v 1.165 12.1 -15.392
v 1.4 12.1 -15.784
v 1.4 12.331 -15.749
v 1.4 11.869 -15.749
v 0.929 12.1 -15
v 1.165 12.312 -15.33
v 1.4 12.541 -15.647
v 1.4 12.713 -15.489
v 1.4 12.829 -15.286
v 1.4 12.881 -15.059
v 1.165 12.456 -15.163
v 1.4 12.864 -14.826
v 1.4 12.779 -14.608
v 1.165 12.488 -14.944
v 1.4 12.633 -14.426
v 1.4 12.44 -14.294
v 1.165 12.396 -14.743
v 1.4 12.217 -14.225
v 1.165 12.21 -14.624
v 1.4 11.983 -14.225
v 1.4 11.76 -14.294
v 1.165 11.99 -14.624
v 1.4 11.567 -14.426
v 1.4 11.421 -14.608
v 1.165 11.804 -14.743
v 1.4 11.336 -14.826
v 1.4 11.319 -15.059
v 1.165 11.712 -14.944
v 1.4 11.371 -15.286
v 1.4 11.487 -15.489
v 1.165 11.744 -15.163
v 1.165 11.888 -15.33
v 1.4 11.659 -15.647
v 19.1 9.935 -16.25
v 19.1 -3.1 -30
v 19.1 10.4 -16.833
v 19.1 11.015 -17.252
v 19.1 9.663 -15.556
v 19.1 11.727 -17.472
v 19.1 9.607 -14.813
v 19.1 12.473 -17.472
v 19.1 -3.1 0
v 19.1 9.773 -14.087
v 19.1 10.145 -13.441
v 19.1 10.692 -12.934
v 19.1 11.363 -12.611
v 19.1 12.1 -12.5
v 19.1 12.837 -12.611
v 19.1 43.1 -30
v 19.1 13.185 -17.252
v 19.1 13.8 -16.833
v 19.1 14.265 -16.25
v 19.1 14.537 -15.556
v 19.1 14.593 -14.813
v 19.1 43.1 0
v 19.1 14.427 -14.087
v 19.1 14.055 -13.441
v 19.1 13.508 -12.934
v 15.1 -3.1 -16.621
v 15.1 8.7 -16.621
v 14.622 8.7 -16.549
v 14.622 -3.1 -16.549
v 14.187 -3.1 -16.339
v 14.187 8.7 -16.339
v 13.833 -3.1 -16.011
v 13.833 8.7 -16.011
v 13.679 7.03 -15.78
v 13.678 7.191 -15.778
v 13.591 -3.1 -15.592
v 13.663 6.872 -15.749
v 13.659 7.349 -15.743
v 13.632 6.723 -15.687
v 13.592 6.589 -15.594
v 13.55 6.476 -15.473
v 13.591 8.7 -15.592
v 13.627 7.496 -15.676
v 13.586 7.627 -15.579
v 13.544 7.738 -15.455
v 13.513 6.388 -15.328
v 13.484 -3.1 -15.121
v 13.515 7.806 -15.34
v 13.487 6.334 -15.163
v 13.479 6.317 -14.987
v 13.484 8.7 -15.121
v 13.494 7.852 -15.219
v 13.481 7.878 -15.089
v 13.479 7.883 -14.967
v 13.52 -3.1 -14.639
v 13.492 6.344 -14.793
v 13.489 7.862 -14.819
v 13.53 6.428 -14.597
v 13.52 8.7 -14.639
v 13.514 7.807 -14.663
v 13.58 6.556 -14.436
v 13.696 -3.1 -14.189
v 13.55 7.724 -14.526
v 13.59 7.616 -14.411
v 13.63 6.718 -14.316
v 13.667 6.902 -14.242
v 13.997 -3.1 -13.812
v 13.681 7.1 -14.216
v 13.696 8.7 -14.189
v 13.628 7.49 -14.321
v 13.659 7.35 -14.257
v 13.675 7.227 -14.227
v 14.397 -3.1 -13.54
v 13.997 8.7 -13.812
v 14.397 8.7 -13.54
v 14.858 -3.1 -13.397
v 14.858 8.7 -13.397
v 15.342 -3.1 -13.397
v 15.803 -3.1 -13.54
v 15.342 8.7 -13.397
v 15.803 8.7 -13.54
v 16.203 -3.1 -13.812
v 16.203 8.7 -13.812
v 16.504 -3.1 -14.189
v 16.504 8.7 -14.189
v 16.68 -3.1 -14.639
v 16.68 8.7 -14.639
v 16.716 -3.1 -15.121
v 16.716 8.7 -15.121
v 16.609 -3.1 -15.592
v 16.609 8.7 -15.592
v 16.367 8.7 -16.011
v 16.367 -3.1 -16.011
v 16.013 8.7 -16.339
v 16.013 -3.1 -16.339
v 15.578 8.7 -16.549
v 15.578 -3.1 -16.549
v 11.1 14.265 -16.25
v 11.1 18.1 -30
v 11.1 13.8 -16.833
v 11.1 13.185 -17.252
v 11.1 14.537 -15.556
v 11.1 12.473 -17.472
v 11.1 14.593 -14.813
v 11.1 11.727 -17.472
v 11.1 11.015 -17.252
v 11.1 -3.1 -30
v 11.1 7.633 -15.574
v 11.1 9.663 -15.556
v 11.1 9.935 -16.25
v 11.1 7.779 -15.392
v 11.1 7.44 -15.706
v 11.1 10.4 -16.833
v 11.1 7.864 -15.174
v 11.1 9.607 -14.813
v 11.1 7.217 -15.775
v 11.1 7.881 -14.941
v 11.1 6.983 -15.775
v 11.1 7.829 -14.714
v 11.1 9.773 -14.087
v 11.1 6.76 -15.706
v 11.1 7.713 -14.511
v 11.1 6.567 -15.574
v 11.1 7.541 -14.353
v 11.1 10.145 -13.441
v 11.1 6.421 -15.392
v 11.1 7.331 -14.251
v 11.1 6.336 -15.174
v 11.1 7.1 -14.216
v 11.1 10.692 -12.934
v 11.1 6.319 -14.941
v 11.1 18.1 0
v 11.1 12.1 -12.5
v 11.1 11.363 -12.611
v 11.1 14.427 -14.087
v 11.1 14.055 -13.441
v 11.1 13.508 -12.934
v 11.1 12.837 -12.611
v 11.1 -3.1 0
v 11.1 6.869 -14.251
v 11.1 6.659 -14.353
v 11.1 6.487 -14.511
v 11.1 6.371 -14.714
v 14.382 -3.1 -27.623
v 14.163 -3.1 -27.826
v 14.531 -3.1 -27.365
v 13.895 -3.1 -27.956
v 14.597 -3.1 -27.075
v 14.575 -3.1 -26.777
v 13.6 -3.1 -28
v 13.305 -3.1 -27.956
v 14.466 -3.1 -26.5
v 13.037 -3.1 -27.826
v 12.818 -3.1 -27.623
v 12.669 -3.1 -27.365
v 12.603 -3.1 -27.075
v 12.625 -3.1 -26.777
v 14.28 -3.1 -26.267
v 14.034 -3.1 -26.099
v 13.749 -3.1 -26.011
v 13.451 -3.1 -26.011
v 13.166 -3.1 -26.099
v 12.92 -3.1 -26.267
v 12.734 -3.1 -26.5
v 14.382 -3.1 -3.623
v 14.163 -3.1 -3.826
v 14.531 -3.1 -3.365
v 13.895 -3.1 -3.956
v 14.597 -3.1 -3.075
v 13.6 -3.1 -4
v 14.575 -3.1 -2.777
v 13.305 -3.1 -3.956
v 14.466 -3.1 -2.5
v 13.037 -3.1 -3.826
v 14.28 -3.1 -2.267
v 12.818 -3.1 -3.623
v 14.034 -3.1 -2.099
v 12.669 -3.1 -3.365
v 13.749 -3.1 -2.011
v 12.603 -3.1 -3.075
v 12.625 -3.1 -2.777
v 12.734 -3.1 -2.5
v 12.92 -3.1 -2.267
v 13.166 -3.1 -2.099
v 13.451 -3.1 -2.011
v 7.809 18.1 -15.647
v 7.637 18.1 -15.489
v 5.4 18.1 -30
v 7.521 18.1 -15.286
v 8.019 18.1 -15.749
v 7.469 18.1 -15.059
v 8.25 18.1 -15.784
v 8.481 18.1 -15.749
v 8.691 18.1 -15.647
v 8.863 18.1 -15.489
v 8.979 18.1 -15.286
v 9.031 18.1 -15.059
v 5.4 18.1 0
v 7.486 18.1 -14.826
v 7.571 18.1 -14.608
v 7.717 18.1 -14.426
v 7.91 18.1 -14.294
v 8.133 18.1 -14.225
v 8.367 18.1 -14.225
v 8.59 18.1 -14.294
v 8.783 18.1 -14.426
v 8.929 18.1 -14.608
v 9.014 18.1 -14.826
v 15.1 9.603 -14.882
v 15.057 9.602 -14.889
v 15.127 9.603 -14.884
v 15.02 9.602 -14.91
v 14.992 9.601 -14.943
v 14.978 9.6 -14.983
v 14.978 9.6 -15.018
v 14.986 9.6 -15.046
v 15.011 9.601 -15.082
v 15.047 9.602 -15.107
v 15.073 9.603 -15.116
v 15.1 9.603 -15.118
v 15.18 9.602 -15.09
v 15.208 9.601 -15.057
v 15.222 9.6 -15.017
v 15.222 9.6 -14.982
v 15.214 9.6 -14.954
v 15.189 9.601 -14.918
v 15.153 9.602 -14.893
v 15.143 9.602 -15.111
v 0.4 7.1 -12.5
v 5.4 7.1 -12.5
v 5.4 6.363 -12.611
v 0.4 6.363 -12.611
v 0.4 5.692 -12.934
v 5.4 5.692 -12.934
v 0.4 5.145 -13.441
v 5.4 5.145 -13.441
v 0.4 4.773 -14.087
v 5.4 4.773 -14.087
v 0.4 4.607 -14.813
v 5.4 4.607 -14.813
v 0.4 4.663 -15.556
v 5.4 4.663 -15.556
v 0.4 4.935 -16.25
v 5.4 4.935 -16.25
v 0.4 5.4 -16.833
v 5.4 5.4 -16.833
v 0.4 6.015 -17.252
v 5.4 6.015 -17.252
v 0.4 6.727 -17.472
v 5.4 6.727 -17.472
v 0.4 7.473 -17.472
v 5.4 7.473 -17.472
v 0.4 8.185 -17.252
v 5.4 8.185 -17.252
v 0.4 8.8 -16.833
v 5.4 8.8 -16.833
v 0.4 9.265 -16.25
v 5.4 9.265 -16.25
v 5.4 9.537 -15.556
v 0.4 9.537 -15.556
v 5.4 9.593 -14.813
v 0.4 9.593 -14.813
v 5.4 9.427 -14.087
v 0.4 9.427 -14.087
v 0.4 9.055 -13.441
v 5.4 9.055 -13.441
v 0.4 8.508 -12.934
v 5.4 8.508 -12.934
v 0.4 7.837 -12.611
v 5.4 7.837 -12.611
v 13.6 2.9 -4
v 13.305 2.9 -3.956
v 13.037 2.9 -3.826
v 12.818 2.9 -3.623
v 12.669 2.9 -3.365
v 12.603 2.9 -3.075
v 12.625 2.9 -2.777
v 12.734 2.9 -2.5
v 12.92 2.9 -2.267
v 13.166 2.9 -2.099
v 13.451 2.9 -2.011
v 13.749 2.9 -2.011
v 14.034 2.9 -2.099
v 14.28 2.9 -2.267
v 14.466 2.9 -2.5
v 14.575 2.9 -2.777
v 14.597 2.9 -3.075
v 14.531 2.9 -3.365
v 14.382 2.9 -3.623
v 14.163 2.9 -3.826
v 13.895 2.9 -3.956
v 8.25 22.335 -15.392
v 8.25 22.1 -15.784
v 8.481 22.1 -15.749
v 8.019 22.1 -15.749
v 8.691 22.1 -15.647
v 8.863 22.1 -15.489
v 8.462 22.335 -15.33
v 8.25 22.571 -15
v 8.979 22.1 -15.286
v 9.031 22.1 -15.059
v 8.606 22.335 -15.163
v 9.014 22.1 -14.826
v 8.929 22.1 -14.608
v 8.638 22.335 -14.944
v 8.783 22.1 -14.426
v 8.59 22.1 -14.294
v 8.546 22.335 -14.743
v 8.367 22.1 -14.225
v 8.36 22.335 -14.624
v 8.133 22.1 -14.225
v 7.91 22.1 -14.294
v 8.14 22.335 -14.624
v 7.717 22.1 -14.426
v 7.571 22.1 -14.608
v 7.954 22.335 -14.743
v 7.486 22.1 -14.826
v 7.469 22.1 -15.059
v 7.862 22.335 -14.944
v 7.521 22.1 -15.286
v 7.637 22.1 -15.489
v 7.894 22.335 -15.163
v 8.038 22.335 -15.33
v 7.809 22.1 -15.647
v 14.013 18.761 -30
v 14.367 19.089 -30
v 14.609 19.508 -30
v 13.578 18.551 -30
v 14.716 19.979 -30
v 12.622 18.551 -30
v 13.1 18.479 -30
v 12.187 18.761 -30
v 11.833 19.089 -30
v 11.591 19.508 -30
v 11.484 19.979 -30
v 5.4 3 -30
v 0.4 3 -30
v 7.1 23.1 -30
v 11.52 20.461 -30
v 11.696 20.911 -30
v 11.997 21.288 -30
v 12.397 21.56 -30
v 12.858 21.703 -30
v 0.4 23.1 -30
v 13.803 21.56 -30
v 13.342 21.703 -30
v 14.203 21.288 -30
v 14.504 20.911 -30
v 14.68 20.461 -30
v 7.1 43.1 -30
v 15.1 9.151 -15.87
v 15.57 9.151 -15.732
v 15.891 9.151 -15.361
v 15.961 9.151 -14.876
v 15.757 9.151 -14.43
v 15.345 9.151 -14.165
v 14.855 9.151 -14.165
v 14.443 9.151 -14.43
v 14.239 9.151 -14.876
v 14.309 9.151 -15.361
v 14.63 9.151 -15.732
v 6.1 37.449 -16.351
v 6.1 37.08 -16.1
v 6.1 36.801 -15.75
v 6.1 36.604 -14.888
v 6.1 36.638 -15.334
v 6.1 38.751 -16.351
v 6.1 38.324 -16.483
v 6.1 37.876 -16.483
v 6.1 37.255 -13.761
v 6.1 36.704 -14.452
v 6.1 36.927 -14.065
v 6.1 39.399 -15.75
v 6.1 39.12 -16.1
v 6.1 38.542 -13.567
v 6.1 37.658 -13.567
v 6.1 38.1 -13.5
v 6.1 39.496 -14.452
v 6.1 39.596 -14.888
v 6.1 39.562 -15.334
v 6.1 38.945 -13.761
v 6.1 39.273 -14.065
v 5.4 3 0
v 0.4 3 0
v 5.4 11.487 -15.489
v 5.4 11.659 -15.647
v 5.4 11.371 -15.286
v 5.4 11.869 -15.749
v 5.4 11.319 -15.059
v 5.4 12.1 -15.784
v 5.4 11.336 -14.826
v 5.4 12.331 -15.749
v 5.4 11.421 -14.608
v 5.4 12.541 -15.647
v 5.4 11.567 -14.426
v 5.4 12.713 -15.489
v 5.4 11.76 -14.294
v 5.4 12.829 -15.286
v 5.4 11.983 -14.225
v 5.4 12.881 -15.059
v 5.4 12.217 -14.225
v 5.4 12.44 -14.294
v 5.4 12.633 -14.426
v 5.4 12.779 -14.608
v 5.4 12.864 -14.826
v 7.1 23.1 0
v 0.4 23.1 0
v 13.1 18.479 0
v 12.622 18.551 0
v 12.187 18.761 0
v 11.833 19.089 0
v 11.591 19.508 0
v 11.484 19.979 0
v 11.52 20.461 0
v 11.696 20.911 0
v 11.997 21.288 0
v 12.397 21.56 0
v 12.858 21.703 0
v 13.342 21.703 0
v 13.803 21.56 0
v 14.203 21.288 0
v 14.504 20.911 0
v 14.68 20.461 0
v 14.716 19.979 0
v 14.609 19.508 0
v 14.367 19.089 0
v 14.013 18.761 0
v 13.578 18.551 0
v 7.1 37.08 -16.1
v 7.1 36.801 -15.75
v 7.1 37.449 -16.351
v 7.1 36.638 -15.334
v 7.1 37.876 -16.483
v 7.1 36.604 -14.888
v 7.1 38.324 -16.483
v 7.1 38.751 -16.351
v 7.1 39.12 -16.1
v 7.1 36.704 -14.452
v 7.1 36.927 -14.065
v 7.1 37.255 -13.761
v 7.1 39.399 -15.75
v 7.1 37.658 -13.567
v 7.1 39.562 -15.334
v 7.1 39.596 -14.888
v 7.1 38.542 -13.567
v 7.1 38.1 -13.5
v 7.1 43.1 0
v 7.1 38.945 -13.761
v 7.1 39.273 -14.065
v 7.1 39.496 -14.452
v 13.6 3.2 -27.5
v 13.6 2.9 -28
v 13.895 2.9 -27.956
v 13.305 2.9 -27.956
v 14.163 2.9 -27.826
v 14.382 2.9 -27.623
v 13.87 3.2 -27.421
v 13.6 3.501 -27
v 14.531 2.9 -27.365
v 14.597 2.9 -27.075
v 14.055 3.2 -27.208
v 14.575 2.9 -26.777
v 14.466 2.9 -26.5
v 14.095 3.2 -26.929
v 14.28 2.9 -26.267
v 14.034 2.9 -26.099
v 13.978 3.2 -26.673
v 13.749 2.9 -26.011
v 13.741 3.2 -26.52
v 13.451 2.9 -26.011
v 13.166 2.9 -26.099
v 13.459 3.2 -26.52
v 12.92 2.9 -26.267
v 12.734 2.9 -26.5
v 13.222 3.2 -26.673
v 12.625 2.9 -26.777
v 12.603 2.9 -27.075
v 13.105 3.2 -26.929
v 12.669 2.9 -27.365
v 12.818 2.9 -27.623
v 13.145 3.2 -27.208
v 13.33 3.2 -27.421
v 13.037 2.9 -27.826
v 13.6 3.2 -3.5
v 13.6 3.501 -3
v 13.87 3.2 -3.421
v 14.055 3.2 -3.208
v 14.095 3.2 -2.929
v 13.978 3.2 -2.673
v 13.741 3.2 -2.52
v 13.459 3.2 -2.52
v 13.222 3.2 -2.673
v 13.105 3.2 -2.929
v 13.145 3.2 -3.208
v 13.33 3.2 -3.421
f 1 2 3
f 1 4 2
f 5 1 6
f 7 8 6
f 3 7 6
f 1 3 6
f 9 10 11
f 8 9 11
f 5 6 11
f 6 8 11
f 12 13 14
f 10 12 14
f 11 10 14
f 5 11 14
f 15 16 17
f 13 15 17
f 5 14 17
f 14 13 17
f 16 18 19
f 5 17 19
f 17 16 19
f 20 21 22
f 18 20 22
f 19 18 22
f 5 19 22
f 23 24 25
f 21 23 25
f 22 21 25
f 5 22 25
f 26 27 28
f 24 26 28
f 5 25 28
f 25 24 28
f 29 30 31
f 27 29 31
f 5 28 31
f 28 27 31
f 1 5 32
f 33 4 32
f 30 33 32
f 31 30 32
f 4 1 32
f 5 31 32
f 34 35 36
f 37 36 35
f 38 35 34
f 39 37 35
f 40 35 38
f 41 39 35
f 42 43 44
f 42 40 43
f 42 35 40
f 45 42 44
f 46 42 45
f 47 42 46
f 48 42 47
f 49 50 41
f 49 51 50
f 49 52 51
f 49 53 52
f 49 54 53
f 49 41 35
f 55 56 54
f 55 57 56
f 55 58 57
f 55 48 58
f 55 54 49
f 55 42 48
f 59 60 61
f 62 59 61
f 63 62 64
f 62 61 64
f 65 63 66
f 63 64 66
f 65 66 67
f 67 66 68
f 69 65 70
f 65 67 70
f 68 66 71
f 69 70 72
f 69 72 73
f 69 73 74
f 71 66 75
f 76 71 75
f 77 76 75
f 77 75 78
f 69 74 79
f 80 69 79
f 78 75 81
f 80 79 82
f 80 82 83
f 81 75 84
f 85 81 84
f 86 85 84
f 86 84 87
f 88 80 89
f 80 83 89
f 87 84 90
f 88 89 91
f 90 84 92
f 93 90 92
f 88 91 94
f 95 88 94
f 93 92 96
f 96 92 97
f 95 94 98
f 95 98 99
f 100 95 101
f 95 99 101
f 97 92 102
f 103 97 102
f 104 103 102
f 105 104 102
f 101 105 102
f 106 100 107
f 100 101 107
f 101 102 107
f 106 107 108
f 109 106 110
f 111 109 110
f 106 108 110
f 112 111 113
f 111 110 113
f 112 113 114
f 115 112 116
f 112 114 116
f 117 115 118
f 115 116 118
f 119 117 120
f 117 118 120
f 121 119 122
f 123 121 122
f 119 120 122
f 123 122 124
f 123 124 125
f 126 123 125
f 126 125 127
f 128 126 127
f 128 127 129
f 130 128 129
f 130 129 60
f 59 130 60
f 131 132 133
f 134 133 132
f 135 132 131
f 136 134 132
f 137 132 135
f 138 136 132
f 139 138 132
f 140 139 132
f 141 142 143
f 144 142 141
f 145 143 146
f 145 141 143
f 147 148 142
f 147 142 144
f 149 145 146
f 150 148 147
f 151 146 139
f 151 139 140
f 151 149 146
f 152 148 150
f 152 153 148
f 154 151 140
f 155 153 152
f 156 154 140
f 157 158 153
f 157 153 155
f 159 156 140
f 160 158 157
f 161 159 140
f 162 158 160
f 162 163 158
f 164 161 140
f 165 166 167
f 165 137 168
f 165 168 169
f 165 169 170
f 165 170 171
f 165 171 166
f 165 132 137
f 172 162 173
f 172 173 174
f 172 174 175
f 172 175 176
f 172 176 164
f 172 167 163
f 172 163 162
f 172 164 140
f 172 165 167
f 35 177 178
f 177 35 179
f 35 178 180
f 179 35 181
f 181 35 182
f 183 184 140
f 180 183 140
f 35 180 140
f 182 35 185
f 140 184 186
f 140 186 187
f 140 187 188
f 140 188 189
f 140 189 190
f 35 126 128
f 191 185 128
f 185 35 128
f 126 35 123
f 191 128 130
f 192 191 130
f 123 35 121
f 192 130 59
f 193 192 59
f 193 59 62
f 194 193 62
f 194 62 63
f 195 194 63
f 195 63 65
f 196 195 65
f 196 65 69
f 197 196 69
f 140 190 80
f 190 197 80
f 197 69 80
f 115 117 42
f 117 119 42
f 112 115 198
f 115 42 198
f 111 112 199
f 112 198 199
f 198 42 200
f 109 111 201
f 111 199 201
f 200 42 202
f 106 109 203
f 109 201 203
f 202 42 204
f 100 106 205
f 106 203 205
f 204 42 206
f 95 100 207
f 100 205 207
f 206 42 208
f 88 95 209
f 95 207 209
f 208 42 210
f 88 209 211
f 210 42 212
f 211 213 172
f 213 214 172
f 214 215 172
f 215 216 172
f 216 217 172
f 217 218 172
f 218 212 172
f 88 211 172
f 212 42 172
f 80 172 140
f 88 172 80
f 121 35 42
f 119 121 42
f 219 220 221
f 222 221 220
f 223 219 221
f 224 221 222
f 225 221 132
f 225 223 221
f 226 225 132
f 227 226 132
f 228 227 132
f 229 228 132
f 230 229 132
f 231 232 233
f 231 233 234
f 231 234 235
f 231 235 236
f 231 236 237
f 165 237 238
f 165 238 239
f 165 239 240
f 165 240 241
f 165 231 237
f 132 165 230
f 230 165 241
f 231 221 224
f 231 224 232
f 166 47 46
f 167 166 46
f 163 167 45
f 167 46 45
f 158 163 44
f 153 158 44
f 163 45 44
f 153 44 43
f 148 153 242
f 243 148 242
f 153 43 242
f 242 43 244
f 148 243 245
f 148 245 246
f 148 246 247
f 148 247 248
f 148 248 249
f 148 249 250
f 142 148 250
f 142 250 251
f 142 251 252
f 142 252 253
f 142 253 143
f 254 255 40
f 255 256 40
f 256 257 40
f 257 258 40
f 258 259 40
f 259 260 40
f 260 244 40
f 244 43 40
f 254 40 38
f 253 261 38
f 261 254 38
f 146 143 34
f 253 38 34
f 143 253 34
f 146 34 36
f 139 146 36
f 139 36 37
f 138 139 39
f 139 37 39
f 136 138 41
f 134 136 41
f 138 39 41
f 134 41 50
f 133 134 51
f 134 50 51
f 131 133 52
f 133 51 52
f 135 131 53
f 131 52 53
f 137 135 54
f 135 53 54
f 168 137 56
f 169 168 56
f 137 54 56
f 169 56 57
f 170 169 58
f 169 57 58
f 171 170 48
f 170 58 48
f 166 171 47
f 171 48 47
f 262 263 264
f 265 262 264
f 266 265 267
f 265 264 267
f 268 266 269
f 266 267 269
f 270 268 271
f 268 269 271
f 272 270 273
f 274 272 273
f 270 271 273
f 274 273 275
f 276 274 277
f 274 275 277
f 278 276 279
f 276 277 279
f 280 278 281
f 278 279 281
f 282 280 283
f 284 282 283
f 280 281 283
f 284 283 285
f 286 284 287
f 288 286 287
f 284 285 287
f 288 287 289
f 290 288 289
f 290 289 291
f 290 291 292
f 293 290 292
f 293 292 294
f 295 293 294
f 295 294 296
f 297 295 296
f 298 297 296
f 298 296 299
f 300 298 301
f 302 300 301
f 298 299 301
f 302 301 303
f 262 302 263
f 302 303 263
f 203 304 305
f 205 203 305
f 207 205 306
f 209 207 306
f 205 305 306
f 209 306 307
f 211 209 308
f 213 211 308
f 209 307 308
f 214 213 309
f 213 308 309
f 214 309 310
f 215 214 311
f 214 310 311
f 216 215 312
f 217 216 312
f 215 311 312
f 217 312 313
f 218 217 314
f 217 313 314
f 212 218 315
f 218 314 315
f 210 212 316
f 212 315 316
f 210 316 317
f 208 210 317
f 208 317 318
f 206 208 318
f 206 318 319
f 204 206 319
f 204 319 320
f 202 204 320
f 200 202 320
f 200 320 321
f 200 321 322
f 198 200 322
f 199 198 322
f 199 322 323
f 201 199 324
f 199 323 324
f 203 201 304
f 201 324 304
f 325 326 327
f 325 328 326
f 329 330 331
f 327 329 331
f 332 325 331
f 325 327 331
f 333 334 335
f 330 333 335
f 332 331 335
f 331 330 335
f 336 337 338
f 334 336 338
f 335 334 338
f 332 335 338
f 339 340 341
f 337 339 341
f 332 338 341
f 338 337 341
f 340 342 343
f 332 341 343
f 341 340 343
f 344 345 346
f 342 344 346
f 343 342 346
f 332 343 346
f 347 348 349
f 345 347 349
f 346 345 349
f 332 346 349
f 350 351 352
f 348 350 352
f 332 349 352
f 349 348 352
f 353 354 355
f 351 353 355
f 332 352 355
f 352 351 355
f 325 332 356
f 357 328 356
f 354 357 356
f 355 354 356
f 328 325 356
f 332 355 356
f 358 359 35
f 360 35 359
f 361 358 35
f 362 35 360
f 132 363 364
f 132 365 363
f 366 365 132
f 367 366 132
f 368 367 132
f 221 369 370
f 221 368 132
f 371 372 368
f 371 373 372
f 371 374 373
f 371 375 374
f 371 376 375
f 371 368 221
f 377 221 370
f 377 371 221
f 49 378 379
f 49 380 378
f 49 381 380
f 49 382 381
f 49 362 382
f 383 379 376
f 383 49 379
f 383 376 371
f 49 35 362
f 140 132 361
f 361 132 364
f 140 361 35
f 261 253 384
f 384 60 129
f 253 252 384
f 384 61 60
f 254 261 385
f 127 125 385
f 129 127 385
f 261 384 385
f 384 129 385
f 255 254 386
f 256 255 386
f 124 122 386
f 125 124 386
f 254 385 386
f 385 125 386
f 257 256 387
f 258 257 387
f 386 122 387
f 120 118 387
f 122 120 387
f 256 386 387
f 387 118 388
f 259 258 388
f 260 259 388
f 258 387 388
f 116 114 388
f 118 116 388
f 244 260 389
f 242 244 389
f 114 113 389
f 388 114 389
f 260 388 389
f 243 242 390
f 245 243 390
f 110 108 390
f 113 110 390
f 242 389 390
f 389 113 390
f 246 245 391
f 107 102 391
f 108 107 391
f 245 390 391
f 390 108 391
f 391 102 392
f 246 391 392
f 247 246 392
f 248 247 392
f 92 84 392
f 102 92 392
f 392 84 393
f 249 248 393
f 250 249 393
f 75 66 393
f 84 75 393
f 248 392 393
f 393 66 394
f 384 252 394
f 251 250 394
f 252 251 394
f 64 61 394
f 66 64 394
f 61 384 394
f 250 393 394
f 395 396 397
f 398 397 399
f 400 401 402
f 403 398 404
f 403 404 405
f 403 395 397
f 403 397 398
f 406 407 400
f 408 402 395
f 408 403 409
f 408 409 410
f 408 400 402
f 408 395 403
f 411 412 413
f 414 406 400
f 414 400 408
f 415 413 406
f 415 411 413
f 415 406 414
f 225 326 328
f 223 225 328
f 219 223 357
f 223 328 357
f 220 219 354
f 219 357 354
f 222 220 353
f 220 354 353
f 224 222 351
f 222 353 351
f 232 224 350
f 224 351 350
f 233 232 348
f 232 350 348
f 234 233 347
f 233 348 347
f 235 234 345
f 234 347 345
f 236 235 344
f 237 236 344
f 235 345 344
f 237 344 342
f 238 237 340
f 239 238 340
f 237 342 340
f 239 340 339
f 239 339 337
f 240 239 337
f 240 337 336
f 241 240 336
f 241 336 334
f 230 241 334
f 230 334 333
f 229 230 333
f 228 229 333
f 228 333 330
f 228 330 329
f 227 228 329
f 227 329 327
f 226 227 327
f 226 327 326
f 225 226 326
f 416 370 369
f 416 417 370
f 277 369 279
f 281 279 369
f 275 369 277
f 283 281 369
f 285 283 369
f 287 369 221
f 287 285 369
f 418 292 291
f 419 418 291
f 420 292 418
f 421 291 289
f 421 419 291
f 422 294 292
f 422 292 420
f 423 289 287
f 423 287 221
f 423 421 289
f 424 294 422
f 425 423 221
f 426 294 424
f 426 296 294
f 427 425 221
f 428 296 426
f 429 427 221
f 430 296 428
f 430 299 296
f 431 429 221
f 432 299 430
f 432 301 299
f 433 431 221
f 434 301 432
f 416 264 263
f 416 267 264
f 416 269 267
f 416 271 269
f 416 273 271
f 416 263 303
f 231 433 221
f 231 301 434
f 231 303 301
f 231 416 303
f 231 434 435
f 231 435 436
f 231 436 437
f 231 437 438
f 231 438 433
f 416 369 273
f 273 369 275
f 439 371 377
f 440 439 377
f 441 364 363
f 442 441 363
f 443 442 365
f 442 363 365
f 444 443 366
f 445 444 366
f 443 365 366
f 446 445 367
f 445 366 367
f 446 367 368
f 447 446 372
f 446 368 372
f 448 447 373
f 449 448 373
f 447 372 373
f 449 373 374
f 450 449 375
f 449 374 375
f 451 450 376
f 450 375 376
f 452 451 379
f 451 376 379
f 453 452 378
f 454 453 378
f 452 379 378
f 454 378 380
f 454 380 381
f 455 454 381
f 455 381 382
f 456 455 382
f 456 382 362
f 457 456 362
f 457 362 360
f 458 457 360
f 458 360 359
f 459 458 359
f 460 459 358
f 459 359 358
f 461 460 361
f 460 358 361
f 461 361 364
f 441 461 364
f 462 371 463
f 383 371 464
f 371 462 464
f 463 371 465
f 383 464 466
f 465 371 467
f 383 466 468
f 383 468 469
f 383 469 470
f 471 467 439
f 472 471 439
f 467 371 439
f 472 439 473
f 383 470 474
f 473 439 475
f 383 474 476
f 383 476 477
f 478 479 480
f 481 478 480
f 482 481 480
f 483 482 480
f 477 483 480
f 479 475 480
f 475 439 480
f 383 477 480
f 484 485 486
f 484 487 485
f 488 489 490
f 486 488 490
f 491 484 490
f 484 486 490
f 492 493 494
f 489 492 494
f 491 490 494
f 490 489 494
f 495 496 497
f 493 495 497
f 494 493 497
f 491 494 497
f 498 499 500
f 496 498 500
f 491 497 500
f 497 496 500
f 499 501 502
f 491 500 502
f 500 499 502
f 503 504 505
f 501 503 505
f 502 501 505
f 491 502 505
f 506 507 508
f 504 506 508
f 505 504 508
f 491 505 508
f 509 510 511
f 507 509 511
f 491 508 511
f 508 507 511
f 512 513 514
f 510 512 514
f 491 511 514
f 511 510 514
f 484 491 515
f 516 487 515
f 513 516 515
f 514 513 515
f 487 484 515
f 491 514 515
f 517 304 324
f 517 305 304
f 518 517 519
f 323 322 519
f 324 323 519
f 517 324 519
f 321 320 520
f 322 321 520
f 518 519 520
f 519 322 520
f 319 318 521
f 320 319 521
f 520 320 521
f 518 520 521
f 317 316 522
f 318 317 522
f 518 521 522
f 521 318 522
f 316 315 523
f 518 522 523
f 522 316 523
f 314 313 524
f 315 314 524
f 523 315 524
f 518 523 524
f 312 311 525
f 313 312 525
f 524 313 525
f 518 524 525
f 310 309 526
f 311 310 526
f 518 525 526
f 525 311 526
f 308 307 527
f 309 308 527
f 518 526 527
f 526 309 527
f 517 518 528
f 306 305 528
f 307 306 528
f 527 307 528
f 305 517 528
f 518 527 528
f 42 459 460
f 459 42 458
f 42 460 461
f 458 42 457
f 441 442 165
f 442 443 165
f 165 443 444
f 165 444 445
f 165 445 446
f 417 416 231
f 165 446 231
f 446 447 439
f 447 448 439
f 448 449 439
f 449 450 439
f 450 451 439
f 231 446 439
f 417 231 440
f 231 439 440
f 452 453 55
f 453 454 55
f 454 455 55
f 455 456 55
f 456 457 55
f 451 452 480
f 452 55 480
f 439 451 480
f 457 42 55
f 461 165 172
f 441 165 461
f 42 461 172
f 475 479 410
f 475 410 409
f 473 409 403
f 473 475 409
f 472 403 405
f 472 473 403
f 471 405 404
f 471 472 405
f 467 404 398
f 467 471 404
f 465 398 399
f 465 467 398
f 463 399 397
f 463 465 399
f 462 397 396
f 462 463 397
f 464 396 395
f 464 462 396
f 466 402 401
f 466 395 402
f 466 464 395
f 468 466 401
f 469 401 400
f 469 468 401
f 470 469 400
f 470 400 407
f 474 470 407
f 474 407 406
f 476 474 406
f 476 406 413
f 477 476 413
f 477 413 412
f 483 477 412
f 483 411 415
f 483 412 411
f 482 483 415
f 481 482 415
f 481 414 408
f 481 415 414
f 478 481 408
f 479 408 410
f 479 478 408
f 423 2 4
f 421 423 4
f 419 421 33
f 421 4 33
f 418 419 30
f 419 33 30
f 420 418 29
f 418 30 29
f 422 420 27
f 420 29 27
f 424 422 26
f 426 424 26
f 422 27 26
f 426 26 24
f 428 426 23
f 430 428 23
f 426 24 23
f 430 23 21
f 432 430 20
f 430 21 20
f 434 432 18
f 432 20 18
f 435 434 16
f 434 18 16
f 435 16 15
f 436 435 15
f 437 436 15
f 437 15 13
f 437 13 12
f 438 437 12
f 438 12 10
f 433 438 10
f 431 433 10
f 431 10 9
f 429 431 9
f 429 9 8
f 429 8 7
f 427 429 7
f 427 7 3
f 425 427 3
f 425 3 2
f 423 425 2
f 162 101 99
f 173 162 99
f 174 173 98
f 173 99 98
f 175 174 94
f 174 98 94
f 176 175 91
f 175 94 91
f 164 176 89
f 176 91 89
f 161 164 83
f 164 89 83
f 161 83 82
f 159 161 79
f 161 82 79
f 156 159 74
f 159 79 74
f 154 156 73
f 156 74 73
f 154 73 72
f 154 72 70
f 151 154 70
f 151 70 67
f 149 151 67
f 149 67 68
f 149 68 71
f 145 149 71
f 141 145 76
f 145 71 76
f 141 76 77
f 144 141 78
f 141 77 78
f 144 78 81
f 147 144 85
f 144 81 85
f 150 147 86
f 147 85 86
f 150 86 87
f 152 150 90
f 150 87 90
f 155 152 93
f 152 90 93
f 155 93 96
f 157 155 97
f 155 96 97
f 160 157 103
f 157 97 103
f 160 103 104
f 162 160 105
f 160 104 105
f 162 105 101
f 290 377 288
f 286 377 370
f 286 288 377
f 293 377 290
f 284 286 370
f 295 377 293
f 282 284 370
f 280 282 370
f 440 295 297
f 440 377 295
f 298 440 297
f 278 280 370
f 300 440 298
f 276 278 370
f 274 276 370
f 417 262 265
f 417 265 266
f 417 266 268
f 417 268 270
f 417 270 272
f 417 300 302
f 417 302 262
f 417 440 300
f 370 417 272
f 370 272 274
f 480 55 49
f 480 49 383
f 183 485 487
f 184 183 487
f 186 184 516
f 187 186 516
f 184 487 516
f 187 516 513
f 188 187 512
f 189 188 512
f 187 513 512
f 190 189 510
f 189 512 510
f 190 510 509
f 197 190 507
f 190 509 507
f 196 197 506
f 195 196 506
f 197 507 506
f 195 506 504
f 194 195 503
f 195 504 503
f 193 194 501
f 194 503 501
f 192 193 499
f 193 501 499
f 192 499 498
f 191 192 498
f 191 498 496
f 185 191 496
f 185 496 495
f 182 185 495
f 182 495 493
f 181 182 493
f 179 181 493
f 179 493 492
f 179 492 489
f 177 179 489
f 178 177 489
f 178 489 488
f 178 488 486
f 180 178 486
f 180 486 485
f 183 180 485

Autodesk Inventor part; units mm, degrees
ref_plane "YZ Plane" through (0, 0, 0) normal (1, 0, 0) x (0, 1, 0)
ref_plane "XZ Plane" through (0, 0, 0) normal (0, 1, 0) x (-1, 0, 0)
ref_plane "XY Plane" through (0, 0, 0) normal (0, 0, 1) x (1, 0, 0)
ref_plane "Arbeitsebene1" through (0, 0, 0) normal (0, 0, -1) x (-1, 0, 0)
sketch "Skizze1" plane through (0, 0, 0) normal (0, 0, -1) x (-1, 0, 0)
  line L0 (-9, -16) -> (-9, 16) construction
  line L1 (-9, 16) -> (-7.5, 16) construction
  line L2 (-7.5, -1) -> (-7.5, -16) construction
  line L3 (-11.1, -3.1) -> (-19.1, -3.1) construction
  line L4 (-19.1, -3.1) -> (-19.1, 43.1)
  line L5 (-19.1, 43.1) -> (-7.1, 43.1)
  line L6 (-7.1, 23.1) -> (-0.4, 23.1)
  line L7 (-0.4, 23.1) -> (-0.4, 3)
  line L8 (-0.4, 3) -> (-5.4, 3)
  line L9 (-5.4, 3) -> (-5.4, 18.1)
  line L10 (-5.4, 18.1) -> (-11.1, 18.1)
  line L11 (-11.1, 18.1) -> (-11.1, -3.1)
  line L12 (-19.1, -3.1) -> (-11.1, -3.1)
  line L13 (-11.1, -3.1) -> (-9, -3.1) construction
  line L14 (-9, 18.1) -> (-9, 16) construction
  line L15 (-7.5, 16) -> (-5.4, 16) construction
  line L16 (-7.1, 23.1) -> (-7.1, 43.1)
  point P0 (0, 0)
  dimension "d0" = 20
  dimension "d1" = 5
  dimension "d2" = 5
  dimension "d3" = 13
  dimension "d18" = 12
extrude "Extrusion1" add sketch "Skizze1" along normal blind 30
sketch "Skizze2" plane through (7.1, 23.1, 0) normal (-1, 0, 0) x (0, 0, 1)
  line L0 (0, 20) -> (-30, 20) projected
  line L1 (-15, 15) -> (-15, 20) construction
  circle A0 centre (-15, 15) radius 1.5
  point P0 (0, -23.1)
  point P1 (-15, 20)
  point P2 (-15, 20)
  dimension "d6" = 5
  dimension "d94" = 3
sketch "Skizze3" plane through (11.1, -3.1, 0) normal (0, -1, 0) x (1, 0, 0)
  circle A0 centre (4, -15) radius 2 construction
  point P0 (-11.1, 0)
hole "Katzeverbindung" at (15.1, -3.1, -15) direction (0, 1, 0) diameter 3.242 depth 11.8 tip angle 118 thread size "M4x0.7" class "6H" standard "ANSI Metric M Profile"
sketch "Skizze4" plane through (11.1, -3.1, 0) normal (0, -1, 0) x (1, 0, 0)
  circle A0 centre (2.5, -27) radius 1 projected
  circle A1 centre (2.5, -3) radius 1 projected
  point P0 (-11.1, 0)
hole "Zentrierbolzen" at (13.6, -3.1, -3) at (13.6, -3.1, -27) direction (0, 1, 0) diameter 2 depth 6 tip angle 118
sketch "Skizze5" plane through (0, 0, 0) normal (0, 0, 1) x (1, 0, 0)
  line L0 (19.1, 43.1) -> (19.1, -3.1) projected
  line L1 (7.1, 43.1) -> (19.1, 43.1) projected
  point P0 (0, 0)
  point P1 (13.1, 20.1)
  dimension "d92" = 6
  dimension "d93" = 23
hole "seilV" at (13.1, 20.1, 0) direction (0, 0, -1) diameter 3.242 end through all thread size "M4x0.7" class "6H" standard "ANSI Metric M Profile"
sketch "Skizze6" plane through (5.4, 18.1, 0) normal (0, -1, 0) x (1, 0, 0)
  line L0 (5.7, 0) -> (0, 0) construction
  line L1 (0, 0) -> (0, -30) construction
  line L2 (5.7, -30) -> (0, -30) construction
  line L3 (5.7, 0) -> (5.7, -30) construction
  line L4 (5.7, -15) -> (2.85, -15) construction
  line L5 (2.85, -15) -> (2.85, -30) construction
  line L6 (2.85, -15) -> (2.85, 0) construction
  line L7 (2.85, -15) -> (0, -15) construction
  line L8 (5.7, 0) -> (5.7, -30) construction
  point P0 (-5.4, 0)
hole "GLVV" at (8.25, 18.1, -15) direction (0, 1, 0) diameter 1.567 depth 4 tip angle 118 thread size "M2x0.4" class "6H" standard "ANSI Metric M Profile"
sketch "Skizze7" plane through (11.1, -3.1, 0) normal (-1, 0, 0) x (0, 0, 1)
  line L0 (-30, 19.2) -> (0, 19.2) construction
  line L1 (0, 0) -> (0, 21.2) construction
  line L2 (0, 21.2) -> (-30, 21.2) construction
  line L3 (-30, 0) -> (-30, 21.2) construction
  line L4 (0, 0) -> (-30, 0) construction
  line L5 (-30, 10.2) -> (-15, 10.2) construction
  line L6 (-15, 10.2) -> (0, 10.2) construction
  line L7 (-15, 10.2) -> (-15, 19.2) construction
  point P0 (0, 3.1)
  dimension "d62" = 9
hole "GLVO" at (11.1, 7.1, -15) direction (1, 0, 0) diameter 1.567 depth 4 tip angle 118 thread size "M2x0.4" class "6H" standard "ANSI Metric M Profile"
sketch "Skizze8" plane through (5.4, 3, 0) normal (1, 0, 0) x (0, 0, -1)
  line L0 (0, 15.1) -> (0, 0) construction
  line L1 (0, 0) -> (30, 0) construction
  line L2 (30, 15.1) -> (30, 0) construction
  line L3 (0, 15.1) -> (30, 15.1) construction
  line L4 (0, 13.1) -> (30, 13.1) construction
  line L5 (15, 9.1) -> (15, 13.1) construction
  line L6 (15, 9.1) -> (0, 9.1) construction
  line L7 (15, 9.1) -> (30, 9.1) construction
  line L8 (30, 15.1) -> (30, 0) construction
  point P0 (0, -3)
  dimension "d70" = 4
hole "GLVU" at (5.4, 12.1, -15) direction (-1, 0, 0) diameter 1.567 depth 4 tip angle 118 thread size "M2x0.4" class "6H" standard "ANSI Metric M Profile"
sketch "Skizze9" plane through (0.4, 3, 0) normal (-1, 0, 0) x (0, 0, 1)
  circle A0 centre (-15, 4.1) radius 1 projected
  point P0 (0, -3)
hole "DLVU" at (0.4, 7.1, -15) direction (1, 0, 0) diameter 5 depth 5
sketch "Skizze10" plane through (11.1, -3.1, 0) normal (-1, 0, 0) x (0, 0, 1)
  circle A0 centre (-15, 15.2) radius 0.7835 projected
  point P0 (0, 3.1)
hole "DLVO" at (11.1, 12.1, -15) direction (1, 0, 0) diameter 5 end through all
extrude "Extrusion2" add sketch "Skizze2" along normal blind 1
properties part number "Katze_Lagerhalter_vorne" material "Aluminium 6061, Katze"
